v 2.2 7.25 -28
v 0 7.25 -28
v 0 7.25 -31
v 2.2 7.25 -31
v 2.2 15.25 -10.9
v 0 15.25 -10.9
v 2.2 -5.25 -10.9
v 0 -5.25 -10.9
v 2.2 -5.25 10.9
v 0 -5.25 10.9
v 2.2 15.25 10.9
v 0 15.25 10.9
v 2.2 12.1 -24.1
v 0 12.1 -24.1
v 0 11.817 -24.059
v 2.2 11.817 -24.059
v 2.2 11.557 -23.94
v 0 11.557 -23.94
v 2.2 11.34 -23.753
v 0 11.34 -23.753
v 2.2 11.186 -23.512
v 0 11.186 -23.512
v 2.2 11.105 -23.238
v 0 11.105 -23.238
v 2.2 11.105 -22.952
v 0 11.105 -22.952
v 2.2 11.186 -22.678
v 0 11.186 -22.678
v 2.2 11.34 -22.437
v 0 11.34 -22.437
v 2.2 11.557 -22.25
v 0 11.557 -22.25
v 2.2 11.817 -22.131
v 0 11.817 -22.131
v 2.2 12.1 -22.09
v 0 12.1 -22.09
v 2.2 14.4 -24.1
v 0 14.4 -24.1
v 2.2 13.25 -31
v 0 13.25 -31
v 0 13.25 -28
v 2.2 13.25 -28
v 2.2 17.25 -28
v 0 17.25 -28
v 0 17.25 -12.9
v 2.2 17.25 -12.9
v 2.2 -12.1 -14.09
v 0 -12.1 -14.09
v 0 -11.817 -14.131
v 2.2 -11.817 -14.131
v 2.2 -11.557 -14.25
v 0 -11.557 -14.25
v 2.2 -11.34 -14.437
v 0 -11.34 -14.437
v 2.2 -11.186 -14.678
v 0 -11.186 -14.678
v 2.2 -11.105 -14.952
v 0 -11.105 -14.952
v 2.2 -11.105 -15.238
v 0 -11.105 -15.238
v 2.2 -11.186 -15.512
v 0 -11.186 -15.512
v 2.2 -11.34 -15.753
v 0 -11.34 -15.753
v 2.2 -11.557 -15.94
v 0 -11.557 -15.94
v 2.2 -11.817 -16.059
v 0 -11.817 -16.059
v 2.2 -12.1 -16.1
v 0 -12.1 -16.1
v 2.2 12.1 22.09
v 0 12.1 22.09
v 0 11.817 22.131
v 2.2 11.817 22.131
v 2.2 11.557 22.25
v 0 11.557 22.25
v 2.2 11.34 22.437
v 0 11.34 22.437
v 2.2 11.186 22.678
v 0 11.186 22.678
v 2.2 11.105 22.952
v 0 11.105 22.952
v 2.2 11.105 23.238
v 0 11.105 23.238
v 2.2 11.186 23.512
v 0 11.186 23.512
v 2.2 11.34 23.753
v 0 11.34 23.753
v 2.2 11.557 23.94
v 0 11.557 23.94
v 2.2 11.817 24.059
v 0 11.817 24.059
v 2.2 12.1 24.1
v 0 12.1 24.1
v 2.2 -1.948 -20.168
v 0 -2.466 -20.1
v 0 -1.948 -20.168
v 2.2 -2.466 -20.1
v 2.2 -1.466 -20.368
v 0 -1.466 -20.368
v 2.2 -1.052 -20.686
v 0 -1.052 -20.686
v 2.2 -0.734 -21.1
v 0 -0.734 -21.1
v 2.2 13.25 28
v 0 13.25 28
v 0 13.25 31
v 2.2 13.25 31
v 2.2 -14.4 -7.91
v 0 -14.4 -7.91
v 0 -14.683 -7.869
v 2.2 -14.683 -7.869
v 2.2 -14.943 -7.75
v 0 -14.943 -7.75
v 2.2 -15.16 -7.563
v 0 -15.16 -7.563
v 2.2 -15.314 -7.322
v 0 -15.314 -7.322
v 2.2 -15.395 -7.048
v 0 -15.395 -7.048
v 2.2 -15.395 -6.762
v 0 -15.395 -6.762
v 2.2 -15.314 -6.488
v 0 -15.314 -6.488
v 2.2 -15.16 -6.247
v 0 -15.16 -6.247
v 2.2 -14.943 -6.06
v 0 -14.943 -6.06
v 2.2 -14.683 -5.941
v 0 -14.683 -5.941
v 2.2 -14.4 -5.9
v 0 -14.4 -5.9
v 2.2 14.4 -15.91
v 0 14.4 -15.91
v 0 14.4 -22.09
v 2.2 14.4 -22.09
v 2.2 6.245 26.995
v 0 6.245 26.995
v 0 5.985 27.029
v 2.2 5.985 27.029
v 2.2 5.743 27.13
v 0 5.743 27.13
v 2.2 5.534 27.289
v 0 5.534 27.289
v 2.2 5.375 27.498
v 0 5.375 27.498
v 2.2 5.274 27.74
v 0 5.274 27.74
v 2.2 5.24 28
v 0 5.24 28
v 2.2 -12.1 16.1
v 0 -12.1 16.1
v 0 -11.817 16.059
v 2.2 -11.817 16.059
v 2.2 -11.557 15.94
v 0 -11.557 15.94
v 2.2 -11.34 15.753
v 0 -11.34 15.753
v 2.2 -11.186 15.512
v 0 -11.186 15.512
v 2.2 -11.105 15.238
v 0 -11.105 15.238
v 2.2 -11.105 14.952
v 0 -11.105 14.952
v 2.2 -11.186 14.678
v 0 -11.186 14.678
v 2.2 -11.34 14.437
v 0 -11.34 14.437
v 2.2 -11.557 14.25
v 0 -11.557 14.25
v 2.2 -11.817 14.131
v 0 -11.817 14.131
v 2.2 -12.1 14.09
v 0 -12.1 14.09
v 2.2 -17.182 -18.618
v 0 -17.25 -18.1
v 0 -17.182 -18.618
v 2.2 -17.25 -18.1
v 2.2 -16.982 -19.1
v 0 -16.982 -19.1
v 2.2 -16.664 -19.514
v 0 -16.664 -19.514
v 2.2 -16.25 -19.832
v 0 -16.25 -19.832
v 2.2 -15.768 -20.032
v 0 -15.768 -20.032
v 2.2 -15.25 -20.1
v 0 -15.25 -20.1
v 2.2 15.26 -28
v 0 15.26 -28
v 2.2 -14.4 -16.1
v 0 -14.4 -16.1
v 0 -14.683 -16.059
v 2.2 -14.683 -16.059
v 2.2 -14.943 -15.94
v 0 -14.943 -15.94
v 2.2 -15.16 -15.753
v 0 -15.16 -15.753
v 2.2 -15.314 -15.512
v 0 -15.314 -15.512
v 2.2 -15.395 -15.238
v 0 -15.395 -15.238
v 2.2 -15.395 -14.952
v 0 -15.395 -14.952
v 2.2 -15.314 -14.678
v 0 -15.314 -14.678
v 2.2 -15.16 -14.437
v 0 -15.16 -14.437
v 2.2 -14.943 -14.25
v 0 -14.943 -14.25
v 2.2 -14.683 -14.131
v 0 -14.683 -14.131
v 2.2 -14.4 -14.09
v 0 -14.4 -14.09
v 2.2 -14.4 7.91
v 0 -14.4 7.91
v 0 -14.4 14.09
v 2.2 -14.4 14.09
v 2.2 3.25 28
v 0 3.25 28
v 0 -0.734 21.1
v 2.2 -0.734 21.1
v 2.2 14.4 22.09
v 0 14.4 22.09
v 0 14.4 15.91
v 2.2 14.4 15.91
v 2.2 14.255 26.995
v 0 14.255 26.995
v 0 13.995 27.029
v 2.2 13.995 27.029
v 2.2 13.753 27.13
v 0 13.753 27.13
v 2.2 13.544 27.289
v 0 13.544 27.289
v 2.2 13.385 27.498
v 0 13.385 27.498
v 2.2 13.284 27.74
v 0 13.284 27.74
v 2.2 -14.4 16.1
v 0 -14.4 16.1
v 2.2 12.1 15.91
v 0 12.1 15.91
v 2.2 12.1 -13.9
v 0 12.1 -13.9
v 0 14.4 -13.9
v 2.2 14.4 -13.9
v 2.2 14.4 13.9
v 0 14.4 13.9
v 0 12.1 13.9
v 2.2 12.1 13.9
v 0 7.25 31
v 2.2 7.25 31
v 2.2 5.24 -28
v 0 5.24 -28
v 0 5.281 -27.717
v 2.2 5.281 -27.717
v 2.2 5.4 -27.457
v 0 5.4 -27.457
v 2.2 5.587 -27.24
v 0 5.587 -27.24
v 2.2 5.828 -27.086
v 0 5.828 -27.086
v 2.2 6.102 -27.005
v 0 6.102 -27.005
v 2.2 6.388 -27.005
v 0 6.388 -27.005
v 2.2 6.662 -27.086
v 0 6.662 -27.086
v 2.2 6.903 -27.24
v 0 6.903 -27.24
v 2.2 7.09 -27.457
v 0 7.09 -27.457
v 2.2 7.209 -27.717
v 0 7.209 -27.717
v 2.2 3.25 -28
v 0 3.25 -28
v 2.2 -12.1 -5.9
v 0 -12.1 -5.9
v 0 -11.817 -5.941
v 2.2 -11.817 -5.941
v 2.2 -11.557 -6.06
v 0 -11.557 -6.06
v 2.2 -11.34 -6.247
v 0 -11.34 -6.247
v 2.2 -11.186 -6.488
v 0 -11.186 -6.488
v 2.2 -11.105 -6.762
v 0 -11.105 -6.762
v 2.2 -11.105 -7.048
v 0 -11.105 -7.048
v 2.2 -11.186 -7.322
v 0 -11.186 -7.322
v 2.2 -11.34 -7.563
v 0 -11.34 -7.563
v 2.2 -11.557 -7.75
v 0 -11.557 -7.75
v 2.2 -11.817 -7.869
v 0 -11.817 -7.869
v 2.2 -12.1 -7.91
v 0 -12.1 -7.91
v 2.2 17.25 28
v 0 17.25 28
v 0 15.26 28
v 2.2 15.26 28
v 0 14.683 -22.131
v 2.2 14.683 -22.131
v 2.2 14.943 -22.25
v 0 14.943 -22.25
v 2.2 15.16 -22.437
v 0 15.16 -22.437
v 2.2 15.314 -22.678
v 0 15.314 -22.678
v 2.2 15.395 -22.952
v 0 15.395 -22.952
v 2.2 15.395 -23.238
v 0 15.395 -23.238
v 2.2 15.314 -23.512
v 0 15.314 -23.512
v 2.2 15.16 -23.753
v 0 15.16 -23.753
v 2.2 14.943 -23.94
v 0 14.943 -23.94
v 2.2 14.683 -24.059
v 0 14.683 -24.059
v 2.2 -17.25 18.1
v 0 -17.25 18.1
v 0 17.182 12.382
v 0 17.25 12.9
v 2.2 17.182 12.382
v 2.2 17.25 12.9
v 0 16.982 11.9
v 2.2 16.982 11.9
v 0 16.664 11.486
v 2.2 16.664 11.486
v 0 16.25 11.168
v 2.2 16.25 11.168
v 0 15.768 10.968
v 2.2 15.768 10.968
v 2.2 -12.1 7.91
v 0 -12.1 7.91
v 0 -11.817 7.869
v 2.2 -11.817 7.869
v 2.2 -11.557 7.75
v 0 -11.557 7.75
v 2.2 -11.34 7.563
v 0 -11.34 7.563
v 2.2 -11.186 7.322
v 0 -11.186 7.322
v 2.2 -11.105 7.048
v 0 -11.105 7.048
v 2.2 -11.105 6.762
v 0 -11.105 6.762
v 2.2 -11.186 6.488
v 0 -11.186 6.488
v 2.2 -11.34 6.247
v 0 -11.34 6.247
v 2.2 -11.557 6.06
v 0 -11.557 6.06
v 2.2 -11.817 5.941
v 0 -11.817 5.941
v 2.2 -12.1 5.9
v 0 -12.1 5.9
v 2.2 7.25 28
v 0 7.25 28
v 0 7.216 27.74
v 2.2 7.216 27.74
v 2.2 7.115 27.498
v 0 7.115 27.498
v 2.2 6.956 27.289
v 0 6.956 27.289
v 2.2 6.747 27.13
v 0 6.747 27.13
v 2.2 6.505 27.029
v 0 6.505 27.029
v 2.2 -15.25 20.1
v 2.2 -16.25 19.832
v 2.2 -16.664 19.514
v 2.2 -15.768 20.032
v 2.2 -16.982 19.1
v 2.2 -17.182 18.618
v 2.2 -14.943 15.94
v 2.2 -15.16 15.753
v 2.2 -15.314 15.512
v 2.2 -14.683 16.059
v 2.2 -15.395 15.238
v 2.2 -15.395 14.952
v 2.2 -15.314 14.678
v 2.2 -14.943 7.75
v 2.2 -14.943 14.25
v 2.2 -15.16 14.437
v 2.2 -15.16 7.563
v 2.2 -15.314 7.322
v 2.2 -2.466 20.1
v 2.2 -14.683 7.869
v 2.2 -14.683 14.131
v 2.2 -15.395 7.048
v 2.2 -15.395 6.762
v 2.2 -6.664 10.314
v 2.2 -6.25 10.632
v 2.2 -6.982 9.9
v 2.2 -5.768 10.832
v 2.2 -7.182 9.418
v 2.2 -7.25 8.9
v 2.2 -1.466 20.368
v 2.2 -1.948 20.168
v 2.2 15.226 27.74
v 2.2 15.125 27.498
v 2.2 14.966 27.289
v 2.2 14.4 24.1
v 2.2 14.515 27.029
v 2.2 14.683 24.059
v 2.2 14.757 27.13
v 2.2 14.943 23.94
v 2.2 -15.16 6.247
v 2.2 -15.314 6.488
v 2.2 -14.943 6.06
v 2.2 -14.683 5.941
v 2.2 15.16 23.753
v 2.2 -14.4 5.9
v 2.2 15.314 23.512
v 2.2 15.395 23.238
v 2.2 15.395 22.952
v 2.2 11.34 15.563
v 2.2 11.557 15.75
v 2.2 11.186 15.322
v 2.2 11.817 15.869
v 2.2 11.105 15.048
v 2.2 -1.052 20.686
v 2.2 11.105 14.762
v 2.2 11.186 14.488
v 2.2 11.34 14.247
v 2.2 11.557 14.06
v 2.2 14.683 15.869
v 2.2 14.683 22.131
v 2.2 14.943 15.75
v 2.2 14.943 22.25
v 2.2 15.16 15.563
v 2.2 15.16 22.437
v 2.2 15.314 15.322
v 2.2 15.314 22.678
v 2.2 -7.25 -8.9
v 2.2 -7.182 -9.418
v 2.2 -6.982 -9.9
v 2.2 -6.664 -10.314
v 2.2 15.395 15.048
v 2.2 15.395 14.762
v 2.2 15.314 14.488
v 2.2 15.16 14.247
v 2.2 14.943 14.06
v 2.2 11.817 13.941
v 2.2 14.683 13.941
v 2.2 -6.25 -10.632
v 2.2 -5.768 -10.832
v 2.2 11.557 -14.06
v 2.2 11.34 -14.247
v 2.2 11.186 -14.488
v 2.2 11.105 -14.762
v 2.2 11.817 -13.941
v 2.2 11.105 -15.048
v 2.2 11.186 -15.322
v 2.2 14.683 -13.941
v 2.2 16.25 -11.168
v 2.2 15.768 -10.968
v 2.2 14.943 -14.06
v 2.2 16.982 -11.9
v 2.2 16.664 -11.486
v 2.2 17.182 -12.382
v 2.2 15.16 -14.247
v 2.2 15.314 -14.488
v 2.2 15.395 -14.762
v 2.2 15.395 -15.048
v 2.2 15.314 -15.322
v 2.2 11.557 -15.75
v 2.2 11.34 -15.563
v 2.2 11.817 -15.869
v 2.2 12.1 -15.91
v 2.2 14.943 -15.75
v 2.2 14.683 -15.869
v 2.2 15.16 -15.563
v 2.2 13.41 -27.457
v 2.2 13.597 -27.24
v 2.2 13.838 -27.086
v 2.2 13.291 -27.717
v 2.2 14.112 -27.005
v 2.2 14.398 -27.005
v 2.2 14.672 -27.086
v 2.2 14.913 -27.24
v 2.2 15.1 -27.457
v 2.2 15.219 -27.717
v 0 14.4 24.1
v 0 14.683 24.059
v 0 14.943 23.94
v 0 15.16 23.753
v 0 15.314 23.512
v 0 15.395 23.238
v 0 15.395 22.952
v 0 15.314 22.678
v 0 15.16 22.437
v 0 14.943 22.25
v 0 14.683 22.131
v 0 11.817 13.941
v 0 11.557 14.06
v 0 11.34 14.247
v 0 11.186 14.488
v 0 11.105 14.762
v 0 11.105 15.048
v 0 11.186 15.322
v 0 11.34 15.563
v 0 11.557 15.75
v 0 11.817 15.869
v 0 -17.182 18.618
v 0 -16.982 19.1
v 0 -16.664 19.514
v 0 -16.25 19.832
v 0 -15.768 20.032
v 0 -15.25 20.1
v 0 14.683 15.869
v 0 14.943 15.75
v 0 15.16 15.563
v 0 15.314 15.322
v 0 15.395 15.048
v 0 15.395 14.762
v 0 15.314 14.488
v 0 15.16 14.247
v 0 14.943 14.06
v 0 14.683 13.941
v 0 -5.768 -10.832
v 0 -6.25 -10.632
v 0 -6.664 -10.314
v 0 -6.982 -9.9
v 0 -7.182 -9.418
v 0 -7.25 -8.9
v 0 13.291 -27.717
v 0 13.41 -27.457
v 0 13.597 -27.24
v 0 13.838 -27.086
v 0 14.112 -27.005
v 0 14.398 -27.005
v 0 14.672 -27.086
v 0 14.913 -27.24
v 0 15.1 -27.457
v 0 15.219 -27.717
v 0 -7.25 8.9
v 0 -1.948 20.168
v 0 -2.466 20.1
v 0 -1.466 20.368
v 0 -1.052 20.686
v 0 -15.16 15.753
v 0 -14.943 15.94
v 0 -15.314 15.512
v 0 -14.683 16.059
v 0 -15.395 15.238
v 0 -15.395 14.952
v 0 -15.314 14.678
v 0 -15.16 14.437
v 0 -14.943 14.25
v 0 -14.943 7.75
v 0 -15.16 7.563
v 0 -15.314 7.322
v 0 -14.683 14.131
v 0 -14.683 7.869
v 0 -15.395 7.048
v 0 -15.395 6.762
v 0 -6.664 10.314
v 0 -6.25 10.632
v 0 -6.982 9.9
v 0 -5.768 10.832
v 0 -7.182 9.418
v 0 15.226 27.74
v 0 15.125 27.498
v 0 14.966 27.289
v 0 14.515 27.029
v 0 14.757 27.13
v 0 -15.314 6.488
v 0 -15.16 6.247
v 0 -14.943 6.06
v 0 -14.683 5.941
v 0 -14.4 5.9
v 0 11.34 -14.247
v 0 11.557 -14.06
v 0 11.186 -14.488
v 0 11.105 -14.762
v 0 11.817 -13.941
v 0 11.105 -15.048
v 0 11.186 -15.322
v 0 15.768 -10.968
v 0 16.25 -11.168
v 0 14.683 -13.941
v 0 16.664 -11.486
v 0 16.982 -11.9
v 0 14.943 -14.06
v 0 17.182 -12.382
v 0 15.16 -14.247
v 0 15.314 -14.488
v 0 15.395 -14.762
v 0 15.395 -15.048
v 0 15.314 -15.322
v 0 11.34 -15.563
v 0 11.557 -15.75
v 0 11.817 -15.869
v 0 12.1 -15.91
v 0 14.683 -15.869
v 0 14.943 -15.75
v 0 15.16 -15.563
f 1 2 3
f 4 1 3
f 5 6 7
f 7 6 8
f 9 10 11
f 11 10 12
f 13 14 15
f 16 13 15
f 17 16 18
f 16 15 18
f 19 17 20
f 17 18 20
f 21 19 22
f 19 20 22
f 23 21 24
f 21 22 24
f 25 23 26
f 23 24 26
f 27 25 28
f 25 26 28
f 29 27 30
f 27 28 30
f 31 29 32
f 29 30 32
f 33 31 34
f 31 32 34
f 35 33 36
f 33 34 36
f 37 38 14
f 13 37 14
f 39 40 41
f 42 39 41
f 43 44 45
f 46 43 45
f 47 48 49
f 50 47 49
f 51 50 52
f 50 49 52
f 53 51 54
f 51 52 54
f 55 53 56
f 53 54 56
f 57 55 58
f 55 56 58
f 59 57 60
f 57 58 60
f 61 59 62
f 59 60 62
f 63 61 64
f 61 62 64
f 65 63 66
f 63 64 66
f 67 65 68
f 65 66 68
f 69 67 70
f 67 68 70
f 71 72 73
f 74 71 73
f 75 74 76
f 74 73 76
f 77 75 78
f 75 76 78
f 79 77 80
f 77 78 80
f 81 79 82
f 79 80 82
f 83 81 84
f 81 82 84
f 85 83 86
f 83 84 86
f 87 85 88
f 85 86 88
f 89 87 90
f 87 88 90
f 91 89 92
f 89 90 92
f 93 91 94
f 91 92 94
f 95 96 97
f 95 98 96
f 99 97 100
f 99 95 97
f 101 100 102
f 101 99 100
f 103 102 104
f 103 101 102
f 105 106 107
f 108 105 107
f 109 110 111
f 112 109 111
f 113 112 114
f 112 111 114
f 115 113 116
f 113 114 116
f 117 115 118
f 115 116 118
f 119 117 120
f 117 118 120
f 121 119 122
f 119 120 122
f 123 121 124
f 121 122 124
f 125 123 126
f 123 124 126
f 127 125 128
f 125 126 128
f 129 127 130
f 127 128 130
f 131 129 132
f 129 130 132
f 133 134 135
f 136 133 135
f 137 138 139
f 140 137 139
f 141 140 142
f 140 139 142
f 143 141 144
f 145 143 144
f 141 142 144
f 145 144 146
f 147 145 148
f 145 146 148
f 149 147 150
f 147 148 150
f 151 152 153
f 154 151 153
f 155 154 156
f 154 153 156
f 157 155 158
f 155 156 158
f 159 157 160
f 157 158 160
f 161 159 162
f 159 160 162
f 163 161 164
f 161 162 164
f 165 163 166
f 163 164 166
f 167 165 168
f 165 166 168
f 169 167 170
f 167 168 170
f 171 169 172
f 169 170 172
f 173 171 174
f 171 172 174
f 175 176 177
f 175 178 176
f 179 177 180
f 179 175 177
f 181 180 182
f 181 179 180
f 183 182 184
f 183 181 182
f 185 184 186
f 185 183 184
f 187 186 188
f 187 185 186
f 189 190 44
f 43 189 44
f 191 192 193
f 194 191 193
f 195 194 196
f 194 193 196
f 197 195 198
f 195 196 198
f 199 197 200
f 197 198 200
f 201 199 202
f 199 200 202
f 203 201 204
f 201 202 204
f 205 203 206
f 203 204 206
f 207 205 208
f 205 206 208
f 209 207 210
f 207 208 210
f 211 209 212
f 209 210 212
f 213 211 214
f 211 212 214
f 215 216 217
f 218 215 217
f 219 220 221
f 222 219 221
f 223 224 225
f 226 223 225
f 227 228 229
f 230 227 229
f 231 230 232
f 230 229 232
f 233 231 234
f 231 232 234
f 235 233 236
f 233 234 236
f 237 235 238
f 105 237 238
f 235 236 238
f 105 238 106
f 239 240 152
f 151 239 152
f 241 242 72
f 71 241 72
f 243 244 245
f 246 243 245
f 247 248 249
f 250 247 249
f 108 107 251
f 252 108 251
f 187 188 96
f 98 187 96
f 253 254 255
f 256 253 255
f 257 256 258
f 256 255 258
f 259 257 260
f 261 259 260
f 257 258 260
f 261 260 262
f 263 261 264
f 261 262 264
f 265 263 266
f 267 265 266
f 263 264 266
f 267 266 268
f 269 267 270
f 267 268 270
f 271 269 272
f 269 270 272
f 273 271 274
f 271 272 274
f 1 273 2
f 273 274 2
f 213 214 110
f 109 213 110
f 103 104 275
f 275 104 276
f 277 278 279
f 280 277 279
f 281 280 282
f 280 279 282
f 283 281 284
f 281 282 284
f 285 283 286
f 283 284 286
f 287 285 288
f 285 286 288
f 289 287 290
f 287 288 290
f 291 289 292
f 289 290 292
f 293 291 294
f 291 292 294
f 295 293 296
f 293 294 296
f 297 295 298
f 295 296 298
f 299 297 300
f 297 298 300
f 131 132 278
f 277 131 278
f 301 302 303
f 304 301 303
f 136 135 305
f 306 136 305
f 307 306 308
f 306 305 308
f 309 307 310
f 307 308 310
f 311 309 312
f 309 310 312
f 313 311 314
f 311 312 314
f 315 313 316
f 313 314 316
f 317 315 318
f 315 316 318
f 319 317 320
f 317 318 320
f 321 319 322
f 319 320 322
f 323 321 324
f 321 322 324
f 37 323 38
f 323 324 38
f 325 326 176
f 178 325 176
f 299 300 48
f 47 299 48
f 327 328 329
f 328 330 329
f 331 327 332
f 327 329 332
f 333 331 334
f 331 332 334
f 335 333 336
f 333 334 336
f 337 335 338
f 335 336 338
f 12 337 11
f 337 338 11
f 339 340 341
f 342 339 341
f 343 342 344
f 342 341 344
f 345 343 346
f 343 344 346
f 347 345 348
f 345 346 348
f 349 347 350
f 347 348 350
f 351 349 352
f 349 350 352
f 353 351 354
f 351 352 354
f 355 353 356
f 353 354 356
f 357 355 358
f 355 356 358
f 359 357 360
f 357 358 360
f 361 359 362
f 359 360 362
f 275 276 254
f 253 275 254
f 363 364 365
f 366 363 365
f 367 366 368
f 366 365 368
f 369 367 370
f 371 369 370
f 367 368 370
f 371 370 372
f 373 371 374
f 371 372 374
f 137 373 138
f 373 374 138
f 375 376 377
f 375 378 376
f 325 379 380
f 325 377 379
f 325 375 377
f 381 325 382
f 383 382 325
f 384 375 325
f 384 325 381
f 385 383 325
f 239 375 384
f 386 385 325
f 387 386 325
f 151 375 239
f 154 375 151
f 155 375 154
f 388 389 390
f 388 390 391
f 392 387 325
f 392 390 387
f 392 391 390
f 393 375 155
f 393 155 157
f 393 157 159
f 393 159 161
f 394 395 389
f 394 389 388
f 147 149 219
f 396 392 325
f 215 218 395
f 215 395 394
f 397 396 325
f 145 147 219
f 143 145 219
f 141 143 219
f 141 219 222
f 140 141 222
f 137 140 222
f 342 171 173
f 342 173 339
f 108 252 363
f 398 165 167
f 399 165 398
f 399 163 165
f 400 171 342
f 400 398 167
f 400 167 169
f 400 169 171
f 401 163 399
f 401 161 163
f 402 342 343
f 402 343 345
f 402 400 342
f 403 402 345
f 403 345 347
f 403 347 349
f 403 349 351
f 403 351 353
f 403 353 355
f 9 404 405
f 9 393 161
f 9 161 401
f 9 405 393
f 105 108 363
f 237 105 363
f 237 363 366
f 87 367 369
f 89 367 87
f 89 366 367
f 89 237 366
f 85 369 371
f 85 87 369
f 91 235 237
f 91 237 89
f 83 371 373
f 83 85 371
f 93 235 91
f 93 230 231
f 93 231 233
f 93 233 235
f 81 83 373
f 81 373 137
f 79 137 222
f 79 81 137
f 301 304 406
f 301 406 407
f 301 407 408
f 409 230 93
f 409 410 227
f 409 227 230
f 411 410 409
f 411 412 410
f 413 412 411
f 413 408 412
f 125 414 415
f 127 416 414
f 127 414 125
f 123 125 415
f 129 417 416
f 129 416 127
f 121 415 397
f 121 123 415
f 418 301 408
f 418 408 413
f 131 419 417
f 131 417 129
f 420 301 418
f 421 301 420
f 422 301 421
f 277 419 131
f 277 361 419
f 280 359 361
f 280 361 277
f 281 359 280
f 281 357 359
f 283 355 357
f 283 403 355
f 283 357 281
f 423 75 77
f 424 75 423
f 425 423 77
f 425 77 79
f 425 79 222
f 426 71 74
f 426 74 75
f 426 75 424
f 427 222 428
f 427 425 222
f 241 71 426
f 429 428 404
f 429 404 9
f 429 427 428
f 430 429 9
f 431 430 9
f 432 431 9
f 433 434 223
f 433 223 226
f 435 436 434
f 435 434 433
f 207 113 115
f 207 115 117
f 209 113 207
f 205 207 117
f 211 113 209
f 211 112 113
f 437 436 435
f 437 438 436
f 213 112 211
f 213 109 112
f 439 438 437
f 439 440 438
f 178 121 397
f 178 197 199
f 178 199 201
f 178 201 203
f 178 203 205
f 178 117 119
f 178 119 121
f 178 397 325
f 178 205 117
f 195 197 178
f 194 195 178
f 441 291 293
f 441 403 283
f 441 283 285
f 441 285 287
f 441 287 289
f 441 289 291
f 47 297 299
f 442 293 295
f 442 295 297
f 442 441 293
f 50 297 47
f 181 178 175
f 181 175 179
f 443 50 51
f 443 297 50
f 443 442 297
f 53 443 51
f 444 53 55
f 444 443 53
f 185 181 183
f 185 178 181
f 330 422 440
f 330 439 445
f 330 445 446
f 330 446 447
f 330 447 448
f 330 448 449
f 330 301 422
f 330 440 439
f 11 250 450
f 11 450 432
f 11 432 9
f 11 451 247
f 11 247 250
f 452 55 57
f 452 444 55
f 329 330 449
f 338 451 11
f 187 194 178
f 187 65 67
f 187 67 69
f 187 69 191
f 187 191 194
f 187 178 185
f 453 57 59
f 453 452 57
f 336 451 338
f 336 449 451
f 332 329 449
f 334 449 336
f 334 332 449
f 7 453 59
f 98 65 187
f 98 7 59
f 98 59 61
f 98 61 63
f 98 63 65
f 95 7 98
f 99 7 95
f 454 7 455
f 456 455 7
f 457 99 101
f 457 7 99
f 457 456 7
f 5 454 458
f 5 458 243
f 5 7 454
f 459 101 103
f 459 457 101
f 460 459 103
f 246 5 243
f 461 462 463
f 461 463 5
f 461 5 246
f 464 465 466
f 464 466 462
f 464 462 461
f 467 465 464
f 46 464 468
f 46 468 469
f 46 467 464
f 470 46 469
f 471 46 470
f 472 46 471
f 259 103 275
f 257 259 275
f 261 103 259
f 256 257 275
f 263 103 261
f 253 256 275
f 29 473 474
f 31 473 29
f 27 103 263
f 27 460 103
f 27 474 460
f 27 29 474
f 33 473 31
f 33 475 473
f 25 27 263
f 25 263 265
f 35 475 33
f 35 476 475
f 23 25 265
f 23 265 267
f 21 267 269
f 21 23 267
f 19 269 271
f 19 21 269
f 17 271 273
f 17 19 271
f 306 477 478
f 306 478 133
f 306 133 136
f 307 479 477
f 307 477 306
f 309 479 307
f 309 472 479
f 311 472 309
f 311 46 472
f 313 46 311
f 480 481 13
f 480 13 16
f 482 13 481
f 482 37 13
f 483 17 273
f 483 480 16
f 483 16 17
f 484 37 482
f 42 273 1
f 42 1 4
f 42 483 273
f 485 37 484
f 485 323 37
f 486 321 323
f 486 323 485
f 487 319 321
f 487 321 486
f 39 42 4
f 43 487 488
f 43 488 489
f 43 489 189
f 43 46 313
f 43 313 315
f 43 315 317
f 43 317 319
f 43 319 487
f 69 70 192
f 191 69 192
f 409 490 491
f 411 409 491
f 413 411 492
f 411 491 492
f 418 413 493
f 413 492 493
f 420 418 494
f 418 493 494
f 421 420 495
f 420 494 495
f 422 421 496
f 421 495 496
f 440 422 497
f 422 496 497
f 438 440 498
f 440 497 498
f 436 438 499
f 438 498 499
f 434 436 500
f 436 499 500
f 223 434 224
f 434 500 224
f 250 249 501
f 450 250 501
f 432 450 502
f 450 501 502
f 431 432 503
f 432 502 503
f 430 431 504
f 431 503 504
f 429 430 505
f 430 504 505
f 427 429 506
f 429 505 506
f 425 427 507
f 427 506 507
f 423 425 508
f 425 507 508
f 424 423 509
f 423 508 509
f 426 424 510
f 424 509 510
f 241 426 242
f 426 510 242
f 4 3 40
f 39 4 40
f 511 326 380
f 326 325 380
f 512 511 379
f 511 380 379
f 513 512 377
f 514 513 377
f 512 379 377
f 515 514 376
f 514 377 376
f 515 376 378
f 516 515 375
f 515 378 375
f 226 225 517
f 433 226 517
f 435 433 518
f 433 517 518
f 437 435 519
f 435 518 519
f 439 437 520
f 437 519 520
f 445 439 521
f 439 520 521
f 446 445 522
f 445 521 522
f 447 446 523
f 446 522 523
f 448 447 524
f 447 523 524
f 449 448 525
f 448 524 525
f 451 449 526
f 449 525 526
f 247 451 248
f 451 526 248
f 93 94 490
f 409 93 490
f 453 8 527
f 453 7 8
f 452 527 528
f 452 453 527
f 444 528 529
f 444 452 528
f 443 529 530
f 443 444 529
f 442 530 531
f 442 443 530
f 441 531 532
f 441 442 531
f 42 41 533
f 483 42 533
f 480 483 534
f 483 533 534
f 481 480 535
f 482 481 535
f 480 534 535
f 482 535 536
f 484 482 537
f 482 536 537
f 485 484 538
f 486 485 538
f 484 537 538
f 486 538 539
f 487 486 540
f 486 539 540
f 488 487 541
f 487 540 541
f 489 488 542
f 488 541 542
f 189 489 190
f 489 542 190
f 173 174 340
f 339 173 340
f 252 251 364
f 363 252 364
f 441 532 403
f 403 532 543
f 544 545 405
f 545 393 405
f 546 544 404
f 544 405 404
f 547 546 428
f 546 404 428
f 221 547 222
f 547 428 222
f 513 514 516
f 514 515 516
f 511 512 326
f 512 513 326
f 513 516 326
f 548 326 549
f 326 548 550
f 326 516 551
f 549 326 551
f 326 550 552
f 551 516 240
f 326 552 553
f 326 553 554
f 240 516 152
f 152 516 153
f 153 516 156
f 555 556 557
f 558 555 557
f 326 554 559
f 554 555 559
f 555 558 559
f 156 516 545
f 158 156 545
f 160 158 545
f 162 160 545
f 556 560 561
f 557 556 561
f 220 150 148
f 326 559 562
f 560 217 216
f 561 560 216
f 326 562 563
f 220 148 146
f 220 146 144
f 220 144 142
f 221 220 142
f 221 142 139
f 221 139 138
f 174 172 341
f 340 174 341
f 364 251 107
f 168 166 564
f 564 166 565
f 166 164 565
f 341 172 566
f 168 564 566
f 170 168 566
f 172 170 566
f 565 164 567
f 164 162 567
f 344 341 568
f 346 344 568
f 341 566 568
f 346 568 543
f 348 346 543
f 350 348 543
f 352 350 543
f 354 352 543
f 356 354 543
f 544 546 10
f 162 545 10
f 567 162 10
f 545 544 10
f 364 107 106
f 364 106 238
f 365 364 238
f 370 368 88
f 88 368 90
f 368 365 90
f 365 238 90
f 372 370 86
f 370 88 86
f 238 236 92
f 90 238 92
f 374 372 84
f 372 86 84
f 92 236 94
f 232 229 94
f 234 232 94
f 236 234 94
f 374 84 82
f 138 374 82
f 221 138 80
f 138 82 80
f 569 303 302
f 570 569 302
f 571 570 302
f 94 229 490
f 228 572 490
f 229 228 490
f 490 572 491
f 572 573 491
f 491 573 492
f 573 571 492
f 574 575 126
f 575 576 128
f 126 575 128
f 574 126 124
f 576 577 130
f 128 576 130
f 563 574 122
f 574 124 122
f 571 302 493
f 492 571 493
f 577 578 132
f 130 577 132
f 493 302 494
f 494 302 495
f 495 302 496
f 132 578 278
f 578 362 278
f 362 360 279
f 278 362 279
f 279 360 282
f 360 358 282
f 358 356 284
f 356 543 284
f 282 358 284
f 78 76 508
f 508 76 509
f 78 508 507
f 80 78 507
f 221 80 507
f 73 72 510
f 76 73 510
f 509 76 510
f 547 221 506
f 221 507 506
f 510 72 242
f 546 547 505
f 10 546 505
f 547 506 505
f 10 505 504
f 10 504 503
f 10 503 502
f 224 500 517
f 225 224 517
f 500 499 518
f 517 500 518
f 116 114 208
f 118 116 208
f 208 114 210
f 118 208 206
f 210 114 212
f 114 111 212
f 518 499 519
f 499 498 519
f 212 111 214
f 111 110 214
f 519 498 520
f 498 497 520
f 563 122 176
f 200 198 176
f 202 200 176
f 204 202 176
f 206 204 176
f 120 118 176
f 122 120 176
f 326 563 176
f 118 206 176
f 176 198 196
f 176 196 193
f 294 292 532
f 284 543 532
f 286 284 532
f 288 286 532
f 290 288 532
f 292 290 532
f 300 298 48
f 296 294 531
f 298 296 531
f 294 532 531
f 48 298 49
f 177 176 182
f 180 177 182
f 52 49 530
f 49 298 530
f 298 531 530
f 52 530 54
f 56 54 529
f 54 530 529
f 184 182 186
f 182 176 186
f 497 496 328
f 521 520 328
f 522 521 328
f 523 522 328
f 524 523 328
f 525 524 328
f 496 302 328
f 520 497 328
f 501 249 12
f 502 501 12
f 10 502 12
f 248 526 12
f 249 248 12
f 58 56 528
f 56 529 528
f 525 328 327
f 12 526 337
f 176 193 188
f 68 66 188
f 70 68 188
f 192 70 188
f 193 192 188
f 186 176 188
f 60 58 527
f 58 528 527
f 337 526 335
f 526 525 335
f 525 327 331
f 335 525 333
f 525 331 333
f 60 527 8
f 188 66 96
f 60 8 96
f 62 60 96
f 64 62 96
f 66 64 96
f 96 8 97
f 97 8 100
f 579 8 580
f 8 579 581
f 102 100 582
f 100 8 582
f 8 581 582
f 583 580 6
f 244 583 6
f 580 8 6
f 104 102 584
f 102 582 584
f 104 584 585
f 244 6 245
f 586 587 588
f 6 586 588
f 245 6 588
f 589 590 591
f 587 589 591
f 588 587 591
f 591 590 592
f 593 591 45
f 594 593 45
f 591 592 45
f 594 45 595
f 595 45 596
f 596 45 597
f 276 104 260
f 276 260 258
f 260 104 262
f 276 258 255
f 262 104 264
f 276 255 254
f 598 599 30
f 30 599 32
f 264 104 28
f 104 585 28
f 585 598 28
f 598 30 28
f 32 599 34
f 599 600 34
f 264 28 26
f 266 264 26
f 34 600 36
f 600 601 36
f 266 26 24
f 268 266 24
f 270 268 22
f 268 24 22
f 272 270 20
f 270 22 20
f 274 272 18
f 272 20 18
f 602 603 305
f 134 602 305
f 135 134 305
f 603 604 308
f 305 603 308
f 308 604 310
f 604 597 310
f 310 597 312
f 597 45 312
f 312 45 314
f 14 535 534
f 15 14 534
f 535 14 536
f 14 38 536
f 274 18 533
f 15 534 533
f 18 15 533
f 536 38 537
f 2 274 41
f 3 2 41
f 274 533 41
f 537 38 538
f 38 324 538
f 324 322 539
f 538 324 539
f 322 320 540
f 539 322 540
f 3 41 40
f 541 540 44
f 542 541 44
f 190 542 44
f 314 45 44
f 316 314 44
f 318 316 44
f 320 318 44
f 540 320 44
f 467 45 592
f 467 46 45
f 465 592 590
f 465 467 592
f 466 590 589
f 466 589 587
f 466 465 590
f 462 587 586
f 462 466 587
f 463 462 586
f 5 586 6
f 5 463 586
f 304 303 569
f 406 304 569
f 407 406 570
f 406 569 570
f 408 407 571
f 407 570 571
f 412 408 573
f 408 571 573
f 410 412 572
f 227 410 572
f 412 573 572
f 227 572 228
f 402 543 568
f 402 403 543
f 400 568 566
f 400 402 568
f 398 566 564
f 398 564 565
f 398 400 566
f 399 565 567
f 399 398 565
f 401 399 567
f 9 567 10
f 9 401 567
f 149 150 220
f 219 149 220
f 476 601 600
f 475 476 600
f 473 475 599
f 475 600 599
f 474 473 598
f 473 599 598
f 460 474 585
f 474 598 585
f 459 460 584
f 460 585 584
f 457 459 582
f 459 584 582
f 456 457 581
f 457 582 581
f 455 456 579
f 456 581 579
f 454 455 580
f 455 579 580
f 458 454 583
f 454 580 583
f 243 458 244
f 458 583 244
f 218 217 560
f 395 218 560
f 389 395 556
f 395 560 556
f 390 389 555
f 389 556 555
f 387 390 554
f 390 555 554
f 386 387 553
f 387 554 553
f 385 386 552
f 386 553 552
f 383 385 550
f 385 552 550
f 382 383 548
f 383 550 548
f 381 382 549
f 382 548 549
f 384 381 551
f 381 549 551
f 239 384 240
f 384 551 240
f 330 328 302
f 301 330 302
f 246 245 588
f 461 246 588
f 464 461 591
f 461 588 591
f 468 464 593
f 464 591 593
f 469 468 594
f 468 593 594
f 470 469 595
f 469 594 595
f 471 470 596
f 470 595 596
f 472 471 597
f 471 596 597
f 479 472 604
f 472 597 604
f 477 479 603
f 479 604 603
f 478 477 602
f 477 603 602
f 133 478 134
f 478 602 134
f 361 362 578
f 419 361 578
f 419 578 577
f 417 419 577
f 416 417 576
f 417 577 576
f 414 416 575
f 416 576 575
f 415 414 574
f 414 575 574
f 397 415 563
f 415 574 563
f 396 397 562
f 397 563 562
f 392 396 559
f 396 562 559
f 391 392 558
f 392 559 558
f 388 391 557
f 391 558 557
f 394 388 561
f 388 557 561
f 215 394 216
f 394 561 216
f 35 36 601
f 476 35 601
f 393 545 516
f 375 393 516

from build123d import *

# Parameters (mm, degrees)
EXTRUDE_1_DEPTH = 2.2
FILLET_1_R      = 2


with BuildPart() as part:
    # 草图1 → 凸台-拉伸1 (new body)
    with BuildSketch(Plane(origin=(0, 0, 0), x_dir=(0, 0, -1), z_dir=(1, 0, 0))):
        with BuildLine():
            Line((-20.1, -17.25), (20.1, -17.25))
            Line((20.1, -17.25), (20.1, -1.311067127))
            Line((20.1, -1.311067127), (28, 3.25))
            Line((28, 3.25), (28, 5.24))
            ThreePointArc((28, 5.24), (26.995, 6.245), (28, 7.25))
            Line((28, 7.25), (31, 7.25))
            Line((31, 7.25), (31, 13.25))
            Line((31, 13.25), (28, 13.25))
            ThreePointArc((28, 13.25), (26.995, 14.255), (28, 15.26))
            Line((28, 15.26), (28, 17.25))
            Line((28, 17.25), (10.9, 17.25))
            Line((10.9, 17.25), (10.9, -7.25))
            Line((10.9, -7.25), (-10.9, -7.25))
            Line((-10.9, -7.25), (-10.9, 17.25))
            Line((-10.9, 17.25), (-28, 17.25))
            Line((-28, 17.25), (-28, 15.26))
            ThreePointArc((-28, 15.26), (-27.289357685, 14.965642315), (-26.995, 14.255))
            ThreePointArc((-26.995, 14.255), (-27.289357685, 13.544357685), (-28, 13.25))
            Line((-28, 13.25), (-31, 13.25))
            Line((-31, 13.25), (-31, 7.25))
            Line((-31, 7.25), (-28, 7.25))
            ThreePointArc((-28, 7.25), (-27.289357685, 6.955642315), (-26.995, 6.245))
            ThreePointArc((-26.995, 6.245), (-27.289357685, 5.534357685), (-28, 5.24))
            Line((-28, 5.24), (-28, 3.25))
            Line((-28, 3.25), (-20.1, -1.311067127))
            Line((-20.1, -1.311067127), (-20.1, -17.25))
        make_face()
        with BuildLine():
            Line((-7.91, -14.4), (-14.09, -14.4))
            ThreePointArc((-14.09, -14.4), (-15.095, -15.405), (-16.1, -14.4))
            Line((-16.1, -14.4), (-16.1, -12.1))
            ThreePointArc((-16.1, -12.1), (-15.095, -11.095), (-14.09, -12.1))
            Line((-14.09, -12.1), (-7.91, -12.1))
            ThreePointArc((-7.91, -12.1), (-6.905, -11.095), (-5.9, -12.1))
            Line((-5.9, -12.1), (-5.9, -14.4))
            ThreePointArc((-5.9, -14.4), (-6.905, -15.405), (-7.91, -14.4))
        make_face(mode=Mode.SUBTRACT)
        with BuildLine():
            Line((16.1, -12.1), (16.1, -14.4))
            ThreePointArc((16.1, -14.4), (15.095, -15.405), (14.09, -14.4))
            Line((14.09, -14.4), (7.91, -14.4))
            ThreePointArc((7.91, -14.4), (6.905, -15.405), (5.9, -14.4))
            Line((5.9, -14.4), (5.9, -12.1))
            ThreePointArc((5.9, -12.1), (6.905, -11.095), (7.91, -12.1))
            Line((7.91, -12.1), (14.09, -12.1))
            ThreePointArc((14.09, -12.1), (15.095, -11.095), (16.1, -12.1))
        make_face(mode=Mode.SUBTRACT)
        with BuildLine():
            Line((-15.91, 12.1), (-22.09, 12.1))
            ThreePointArc((-22.09, 12.1), (-23.095, 11.095), (-24.1, 12.1))
            Line((-24.1, 12.1), (-24.1, 14.4))
            ThreePointArc((-24.1, 14.4), (-23.095, 15.405), (-22.09, 14.4))
            Line((-22.09, 14.4), (-15.91, 14.4))
            ThreePointArc((-15.91, 14.4), (-14.905, 15.405), (-13.9, 14.4))
            Line((-13.9, 14.4), (-13.9, 12.1))
            ThreePointArc((-13.9, 12.1), (-14.905, 11.095), (-15.91, 12.1))
        make_face(mode=Mode.SUBTRACT)
        with BuildLine():
            Line((13.9, 12.1), (13.9, 14.4))
            ThreePointArc((13.9, 14.4), (14.905, 15.405), (15.91, 14.4))
            Line((15.91, 14.4), (22.09, 14.4))
            ThreePointArc((22.09, 14.4), (23.095, 15.405), (24.1, 14.4))
            Line((24.1, 14.4), (24.1, 12.1))
            ThreePointArc((24.1, 12.1), (23.095, 11.095), (22.09, 12.1))
            Line((22.09, 12.1), (15.91, 12.1))
            ThreePointArc((15.91, 12.1), (14.905, 11.095), (13.9, 12.1))
        make_face(mode=Mode.SUBTRACT)
    extrude(amount=EXTRUDE_1_DEPTH)

    # 圆角1
    fillet_1_edges = [part.edges().sort_by_distance(p)[0] for p in [
        (1.1, -1.311067127, -20.1),
        (1.1, -17.25, -20.1),
        (1.1, -17.25, 20.1),
        (1.1, -1.311067127, 20.1),
        (1.1, 17.25, 10.9),
        (1.1, -7.25, 10.9),
        (1.1, -7.25, -10.9),
        (1.1, 17.25, -10.9),
    ]]
    fillet(fillet_1_edges, radius=FILLET_1_R)


solid = part.part
